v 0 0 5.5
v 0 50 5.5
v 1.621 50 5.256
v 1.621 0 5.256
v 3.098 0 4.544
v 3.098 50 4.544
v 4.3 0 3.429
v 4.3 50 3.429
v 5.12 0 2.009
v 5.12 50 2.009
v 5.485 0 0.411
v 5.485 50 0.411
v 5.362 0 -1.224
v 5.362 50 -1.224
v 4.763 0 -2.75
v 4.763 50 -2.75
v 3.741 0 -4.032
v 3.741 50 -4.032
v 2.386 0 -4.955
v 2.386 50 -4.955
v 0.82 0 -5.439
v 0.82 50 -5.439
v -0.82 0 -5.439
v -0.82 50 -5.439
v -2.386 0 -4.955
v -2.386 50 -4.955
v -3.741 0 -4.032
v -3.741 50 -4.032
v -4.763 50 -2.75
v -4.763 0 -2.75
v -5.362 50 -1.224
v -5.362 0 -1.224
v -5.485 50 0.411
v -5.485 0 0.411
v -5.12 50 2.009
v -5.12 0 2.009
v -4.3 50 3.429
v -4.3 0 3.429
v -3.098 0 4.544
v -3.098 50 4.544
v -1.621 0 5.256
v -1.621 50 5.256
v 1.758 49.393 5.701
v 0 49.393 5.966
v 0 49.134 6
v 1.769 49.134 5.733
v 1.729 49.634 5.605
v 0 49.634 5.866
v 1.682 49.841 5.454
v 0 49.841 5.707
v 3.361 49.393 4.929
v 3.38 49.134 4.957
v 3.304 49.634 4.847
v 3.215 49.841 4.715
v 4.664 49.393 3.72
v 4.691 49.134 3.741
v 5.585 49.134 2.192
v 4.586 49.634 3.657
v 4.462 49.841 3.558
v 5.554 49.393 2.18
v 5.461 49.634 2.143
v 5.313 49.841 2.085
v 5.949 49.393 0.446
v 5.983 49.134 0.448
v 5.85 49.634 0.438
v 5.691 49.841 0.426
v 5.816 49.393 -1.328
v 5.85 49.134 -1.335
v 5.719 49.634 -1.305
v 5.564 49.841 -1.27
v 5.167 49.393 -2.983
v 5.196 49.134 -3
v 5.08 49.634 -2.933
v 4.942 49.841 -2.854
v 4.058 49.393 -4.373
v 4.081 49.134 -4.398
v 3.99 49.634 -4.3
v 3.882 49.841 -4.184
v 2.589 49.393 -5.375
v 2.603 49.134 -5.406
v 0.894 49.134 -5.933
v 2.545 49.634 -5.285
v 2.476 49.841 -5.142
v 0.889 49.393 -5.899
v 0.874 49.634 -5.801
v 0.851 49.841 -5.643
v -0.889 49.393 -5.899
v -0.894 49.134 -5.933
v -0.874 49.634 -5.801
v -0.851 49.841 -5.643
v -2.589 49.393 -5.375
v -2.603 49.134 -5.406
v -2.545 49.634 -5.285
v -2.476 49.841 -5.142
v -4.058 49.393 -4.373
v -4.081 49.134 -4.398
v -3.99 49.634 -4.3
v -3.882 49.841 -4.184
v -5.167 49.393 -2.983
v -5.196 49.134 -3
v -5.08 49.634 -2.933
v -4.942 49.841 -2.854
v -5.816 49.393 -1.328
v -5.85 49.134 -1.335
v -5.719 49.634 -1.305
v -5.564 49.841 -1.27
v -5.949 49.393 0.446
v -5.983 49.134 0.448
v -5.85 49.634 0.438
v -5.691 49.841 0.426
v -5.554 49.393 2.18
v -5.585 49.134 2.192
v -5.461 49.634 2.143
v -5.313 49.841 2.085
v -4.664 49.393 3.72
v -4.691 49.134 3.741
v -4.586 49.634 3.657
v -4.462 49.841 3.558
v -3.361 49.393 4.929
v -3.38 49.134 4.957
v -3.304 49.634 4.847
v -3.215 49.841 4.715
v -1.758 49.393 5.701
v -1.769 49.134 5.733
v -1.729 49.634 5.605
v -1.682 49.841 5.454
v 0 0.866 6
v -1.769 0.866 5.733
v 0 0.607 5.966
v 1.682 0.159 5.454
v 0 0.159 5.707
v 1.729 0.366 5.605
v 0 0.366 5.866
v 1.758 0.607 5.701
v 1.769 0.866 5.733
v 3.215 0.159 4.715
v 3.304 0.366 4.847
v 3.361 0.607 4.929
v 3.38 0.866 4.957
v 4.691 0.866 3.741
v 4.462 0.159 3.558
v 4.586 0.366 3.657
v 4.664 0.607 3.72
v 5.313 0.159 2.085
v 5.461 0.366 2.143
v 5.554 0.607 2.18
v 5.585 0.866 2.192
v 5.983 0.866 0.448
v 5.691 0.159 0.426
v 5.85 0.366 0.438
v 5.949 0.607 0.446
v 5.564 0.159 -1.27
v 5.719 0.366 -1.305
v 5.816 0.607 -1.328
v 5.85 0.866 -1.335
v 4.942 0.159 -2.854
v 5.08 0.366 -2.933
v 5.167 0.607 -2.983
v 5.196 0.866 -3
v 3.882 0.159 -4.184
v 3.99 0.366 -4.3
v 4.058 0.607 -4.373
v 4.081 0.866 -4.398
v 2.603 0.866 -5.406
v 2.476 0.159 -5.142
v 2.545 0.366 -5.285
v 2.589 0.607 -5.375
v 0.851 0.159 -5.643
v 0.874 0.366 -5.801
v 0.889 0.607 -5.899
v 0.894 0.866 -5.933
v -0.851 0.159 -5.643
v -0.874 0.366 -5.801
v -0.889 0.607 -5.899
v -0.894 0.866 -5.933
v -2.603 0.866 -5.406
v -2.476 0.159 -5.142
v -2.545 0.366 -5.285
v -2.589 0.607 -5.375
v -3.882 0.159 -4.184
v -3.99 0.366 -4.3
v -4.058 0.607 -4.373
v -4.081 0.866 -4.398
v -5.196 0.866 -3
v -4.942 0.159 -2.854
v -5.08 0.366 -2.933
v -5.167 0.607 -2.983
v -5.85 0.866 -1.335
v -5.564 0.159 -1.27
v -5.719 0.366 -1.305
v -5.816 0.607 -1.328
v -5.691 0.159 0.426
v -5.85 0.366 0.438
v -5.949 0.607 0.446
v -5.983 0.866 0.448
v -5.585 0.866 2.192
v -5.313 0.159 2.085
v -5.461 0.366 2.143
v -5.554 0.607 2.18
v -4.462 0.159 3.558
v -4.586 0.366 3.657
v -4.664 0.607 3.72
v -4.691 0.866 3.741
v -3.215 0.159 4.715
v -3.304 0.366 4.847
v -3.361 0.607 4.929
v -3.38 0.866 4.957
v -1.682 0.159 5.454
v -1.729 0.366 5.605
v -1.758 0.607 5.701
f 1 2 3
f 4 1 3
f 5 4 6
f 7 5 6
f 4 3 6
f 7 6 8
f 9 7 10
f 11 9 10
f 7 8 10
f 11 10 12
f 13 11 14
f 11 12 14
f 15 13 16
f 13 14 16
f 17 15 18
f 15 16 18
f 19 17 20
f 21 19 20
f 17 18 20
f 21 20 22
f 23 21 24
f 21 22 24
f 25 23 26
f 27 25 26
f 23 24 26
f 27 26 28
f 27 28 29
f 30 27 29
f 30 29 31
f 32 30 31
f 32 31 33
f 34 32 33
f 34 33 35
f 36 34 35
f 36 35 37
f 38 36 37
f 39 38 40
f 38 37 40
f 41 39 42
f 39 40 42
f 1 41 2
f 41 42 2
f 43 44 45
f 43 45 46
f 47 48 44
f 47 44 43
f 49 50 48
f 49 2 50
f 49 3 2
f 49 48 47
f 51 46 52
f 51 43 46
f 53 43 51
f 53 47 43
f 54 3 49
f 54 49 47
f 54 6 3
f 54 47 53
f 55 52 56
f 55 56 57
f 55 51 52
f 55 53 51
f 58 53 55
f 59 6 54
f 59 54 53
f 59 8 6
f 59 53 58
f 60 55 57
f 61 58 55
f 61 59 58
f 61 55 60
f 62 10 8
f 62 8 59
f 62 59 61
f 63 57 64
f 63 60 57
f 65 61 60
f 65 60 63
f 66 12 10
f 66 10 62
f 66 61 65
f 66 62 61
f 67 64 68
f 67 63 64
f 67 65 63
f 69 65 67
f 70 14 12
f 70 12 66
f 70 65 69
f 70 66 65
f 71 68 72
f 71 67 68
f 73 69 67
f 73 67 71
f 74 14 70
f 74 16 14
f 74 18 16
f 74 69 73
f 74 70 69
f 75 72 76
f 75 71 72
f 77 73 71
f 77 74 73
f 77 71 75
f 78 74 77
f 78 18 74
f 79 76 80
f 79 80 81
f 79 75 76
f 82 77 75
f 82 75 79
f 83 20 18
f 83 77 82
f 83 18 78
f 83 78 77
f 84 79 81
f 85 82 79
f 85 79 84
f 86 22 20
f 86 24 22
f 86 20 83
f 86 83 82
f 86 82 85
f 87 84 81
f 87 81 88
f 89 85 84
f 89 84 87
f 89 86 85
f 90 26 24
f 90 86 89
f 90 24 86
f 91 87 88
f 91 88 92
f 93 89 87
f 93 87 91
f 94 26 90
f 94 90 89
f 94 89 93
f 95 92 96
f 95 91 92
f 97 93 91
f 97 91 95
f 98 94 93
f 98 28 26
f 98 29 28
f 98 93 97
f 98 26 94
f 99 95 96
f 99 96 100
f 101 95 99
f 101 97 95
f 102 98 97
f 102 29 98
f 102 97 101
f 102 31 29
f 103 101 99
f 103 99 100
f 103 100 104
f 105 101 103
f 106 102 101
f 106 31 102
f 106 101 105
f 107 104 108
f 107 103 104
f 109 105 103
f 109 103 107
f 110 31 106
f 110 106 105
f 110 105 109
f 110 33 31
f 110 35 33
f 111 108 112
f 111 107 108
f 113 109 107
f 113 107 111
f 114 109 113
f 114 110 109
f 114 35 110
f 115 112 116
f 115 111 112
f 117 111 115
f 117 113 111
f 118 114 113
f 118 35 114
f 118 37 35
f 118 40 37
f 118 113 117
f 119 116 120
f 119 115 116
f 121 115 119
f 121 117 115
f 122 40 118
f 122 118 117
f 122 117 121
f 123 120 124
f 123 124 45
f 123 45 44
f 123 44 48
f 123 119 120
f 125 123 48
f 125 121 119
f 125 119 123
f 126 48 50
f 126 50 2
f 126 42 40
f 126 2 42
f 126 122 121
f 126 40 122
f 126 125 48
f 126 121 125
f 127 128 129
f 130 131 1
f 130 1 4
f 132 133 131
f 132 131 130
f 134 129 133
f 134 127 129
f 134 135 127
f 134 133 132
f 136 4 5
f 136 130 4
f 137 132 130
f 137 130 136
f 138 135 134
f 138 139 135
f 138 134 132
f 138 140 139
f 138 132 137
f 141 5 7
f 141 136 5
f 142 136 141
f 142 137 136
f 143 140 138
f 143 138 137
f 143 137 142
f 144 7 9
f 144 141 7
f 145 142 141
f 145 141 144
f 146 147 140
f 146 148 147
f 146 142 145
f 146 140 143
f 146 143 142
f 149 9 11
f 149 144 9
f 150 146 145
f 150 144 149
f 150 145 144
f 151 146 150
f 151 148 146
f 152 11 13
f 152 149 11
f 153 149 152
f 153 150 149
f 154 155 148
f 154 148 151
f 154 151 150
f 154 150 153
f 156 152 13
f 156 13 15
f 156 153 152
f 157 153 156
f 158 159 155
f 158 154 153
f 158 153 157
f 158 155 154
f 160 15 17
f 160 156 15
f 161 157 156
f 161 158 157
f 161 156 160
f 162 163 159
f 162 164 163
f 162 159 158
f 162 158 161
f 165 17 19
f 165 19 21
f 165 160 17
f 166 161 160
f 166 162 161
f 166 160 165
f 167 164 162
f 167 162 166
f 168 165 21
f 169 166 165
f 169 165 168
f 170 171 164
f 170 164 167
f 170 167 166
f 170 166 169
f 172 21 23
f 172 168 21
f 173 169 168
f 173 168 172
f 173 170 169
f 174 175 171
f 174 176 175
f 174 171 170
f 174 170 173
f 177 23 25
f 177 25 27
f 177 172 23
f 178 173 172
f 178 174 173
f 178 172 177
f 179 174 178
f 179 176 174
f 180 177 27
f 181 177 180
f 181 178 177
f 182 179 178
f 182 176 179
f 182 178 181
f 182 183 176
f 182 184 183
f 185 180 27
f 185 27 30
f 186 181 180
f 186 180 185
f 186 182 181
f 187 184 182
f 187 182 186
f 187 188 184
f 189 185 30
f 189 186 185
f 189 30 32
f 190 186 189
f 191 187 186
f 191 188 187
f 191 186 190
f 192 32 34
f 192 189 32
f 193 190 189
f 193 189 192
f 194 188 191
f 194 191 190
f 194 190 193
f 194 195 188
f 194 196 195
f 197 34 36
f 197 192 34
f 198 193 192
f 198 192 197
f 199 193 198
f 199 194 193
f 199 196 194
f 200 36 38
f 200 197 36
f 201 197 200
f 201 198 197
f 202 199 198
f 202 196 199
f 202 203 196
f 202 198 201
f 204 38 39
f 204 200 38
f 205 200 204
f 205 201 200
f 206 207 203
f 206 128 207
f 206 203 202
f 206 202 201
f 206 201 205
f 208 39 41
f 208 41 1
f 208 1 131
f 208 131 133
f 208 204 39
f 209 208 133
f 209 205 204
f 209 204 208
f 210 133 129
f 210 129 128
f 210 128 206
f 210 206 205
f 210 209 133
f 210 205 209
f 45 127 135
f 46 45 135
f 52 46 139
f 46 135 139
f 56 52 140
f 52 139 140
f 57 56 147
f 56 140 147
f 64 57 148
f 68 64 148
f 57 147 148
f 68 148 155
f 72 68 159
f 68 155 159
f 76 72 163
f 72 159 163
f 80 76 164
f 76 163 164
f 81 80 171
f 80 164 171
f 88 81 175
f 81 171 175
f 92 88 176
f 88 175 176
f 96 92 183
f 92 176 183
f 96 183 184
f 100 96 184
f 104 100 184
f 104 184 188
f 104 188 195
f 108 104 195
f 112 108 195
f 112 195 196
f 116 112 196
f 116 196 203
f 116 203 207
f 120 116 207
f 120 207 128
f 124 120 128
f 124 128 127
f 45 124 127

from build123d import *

# Parameters (mm, degrees)
SKETCH1_R           = 6
BOSS_EXTRUDE1_DEPTH = 50
SKETCH2_R           = 5.5
CUT_EXTRUDE1_DEPTH  = 50
FILLET1_R           = 1
FILLET2_R           = 1


with BuildPart() as part:
    # Sketch1 → Boss-Extrude1 (new body)
    with BuildSketch(Plane(origin=(0, 0, 0), x_dir=(1, 0, 0), z_dir=(0, 1, 0))):
        with Locations(Location((0, 0, 0), (0, 0, 270))):
            Circle(SKETCH1_R)
    extrude(amount=BOSS_EXTRUDE1_DEPTH)

    # Sketch2 → Cut-Extrude1 (cut)
    with BuildSketch(Plane(origin=(0, 50, 0), x_dir=(1, 0, 0), z_dir=(0, 1, 0))):
        with Locations(Location((0, 0, 0), (0, 0, 270))):
            Circle(SKETCH2_R)
    extrude(amount=-CUT_EXTRUDE1_DEPTH, mode=Mode.SUBTRACT)

    # Fillet1
    # the kernel refuses this fillet: 1 mm, written as the material it takes off along each edge
    with BuildSketch(Plane(origin=(0, 50, 0), x_dir=(0, 0, 1), z_dir=(-1, 0, 0))) as fillet1_piece_1:
        with BuildLine():
            CenterArc((5, -0.866025404), FILLET1_R, 0, 60)
            Line((5.5, 0), (5.51, 0.017320508))
            ThreePointArc((5.51, 0.017320508), (5.75, 0.02), (6, 0.02))
            Line((6, 0.02), (6.02, 0))
            Line((6.02, 0), (6.02, -0.866025404))
            Line((6.02, -0.866025404), (6, -0.866025404))
        make_face()
    revolve(axis=Axis((0, 50, 0), (0, 1, 0)), mode=Mode.SUBTRACT)

    # Fillet2
    # the kernel refuses this fillet: 1 mm, written as the material it takes off along each edge
    with BuildSketch(Plane(origin=(0, 0, 0), x_dir=(0, 0, 1), z_dir=(-1, 0, 0))) as fillet2_piece_1:
        with BuildLine():
            CenterArc((5, 0.866025404), FILLET2_R, 300, 60)
            Line((5.5, 0), (5.51, -0.017320508))
            ThreePointArc((5.51, -0.017320508), (5.75, -0.02), (6, -0.02))
            Line((6, -0.02), (6.02, 0))
            Line((6.02, 0), (6.02, 0.866025404))
            Line((6.02, 0.866025404), (6, 0.866025404))
        make_face()
    revolve(axis=Axis((0, 0, 0), (0, 1, 0)), mode=Mode.SUBTRACT)


solid = part.part
